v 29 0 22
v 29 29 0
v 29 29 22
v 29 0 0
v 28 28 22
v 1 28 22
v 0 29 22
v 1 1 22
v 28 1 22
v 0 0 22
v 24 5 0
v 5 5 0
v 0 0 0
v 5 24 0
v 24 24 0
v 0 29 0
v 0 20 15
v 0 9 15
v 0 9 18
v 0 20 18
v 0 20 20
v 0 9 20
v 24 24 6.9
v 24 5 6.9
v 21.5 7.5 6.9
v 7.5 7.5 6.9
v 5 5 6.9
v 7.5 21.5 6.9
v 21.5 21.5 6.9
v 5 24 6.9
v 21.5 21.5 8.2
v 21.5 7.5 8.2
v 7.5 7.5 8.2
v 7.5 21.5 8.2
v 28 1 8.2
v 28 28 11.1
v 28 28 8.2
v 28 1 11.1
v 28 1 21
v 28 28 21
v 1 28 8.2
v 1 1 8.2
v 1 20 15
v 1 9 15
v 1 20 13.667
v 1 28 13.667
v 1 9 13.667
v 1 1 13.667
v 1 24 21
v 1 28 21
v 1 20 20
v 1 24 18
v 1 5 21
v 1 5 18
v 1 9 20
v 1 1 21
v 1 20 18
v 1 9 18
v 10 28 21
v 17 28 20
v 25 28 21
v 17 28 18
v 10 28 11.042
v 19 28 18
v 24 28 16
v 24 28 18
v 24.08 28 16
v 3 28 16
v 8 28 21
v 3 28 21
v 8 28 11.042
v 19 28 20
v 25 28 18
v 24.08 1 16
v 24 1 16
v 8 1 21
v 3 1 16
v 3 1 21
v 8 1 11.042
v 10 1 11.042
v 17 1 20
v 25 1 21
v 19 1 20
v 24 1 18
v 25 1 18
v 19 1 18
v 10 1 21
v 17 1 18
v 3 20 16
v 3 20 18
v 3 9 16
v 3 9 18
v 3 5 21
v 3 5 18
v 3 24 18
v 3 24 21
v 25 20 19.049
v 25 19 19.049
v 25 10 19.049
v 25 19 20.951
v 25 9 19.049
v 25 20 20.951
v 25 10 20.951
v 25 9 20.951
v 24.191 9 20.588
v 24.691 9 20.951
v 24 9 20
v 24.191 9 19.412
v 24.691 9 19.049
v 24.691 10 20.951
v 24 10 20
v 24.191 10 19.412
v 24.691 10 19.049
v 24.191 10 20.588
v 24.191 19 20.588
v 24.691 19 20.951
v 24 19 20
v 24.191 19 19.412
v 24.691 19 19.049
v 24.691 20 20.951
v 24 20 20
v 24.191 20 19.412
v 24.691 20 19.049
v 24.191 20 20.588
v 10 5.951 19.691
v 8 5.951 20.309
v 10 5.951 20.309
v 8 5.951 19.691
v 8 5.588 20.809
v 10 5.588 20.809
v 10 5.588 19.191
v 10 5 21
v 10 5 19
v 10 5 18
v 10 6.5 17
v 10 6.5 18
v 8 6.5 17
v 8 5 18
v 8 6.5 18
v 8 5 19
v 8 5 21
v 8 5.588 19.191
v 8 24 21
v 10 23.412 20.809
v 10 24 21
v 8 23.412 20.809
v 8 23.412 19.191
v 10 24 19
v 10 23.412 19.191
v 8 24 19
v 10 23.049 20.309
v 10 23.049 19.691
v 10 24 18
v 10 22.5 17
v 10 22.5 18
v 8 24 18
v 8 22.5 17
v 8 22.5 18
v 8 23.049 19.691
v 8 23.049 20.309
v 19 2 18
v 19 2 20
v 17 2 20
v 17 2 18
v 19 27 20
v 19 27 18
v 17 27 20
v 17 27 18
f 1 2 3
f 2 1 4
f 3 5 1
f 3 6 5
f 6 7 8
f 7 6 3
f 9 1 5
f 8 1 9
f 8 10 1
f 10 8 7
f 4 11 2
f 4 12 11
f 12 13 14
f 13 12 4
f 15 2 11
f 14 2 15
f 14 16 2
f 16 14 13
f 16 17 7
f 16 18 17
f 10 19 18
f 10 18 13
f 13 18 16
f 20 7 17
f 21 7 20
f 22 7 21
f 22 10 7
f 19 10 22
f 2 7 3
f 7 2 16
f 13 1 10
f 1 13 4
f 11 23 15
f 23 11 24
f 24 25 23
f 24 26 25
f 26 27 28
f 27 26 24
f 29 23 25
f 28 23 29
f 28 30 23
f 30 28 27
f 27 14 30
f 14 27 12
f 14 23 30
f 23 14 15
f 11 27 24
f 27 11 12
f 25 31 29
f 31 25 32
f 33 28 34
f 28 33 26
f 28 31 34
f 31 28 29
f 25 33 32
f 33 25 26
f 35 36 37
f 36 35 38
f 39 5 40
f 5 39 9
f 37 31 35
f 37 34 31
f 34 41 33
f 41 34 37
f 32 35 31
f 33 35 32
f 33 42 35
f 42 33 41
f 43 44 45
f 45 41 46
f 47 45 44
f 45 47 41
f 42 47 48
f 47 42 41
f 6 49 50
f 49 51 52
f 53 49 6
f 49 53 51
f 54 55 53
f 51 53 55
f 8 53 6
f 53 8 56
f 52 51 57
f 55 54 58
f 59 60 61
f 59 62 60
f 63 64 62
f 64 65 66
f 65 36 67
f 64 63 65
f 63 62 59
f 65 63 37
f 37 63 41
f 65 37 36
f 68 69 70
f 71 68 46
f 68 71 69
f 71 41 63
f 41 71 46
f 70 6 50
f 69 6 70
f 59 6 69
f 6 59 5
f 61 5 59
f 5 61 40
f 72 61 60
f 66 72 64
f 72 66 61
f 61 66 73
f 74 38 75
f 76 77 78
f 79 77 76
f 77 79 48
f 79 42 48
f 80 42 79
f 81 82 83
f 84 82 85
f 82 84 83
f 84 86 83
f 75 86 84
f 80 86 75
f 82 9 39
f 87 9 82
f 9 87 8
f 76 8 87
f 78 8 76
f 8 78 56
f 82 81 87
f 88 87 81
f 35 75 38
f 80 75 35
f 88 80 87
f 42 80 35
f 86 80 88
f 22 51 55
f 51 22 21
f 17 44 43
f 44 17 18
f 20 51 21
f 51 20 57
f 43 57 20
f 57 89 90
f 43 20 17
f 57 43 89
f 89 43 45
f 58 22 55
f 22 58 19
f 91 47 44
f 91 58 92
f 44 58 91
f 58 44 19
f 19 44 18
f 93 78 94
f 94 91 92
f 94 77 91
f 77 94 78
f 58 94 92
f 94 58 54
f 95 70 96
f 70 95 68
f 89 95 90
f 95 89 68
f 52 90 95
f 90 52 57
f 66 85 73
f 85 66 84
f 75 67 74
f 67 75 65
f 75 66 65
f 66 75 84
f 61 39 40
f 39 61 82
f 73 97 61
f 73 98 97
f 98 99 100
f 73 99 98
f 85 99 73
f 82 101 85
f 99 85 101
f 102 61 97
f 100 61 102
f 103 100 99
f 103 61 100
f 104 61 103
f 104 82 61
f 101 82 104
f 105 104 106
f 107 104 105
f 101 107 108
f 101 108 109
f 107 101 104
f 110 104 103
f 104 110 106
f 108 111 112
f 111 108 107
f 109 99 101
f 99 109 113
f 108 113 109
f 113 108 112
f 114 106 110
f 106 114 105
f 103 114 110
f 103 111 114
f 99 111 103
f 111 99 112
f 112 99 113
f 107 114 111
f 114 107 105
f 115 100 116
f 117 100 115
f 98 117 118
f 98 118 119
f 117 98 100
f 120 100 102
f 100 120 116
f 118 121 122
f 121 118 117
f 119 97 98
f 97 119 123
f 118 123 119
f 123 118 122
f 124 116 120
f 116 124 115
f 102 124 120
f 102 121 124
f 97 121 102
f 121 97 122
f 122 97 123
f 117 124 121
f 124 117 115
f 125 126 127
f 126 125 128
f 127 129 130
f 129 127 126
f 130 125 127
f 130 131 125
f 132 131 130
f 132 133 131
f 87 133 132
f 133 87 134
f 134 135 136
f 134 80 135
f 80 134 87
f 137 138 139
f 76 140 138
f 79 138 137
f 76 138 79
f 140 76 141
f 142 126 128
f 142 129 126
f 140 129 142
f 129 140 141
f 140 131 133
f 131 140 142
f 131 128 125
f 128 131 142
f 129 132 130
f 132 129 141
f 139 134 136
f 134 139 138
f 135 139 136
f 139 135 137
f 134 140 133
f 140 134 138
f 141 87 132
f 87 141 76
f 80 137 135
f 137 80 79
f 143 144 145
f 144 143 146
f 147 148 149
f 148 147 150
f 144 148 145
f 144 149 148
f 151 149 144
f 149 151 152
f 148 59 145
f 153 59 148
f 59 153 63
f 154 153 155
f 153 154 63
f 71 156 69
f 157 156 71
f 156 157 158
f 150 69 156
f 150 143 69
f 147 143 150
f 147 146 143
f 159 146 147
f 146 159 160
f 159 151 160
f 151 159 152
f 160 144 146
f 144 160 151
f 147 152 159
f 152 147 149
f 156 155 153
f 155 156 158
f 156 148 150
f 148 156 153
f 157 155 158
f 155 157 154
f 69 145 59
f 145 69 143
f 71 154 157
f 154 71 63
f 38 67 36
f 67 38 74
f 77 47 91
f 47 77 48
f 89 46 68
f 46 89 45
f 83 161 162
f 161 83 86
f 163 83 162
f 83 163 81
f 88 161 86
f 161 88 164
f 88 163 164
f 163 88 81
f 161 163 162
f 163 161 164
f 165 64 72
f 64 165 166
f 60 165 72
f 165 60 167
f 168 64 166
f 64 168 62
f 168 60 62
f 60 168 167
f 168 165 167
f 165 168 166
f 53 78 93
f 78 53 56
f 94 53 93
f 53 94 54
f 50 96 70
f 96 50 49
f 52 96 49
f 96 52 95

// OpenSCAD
// A simple enclosure for the Waveshare rp2040-zero board and a single MX compatible keyswitch
// 2023 davidm@davidmonro.net

module prism(l, w, h){
    polyhedron(
        points=[[0,0,0], [l,0,0], [l,w,0], [0,w,0], [0,w,h], [l,w,h]],
        faces=[[0,1,2,3],[5,4,3,2],[0,4,5,1],[0,3,4],[5,2,1]]
    );
}

translate([0,0,0]) {
    difference() {
        union() {
            cube([29,29,22]);
            
        }
        translate([5,5,-0.1]) cube([19,19,7]);
        translate([7.5,7.5,0]) cube([14,14,9]);
        translate([1,1,8.2]) cube([27,27,17]);
        translate([-0.1,9,15]) cube([20,11,5]); // USB
    }
    translate([0,0,16]) cube([3,9,2]);
    translate([0,20,16]) cube([3,9,2]);
    translate([24,0,16]) cube([5,29,2]);
    translate([25,0,16]) cube([4,29,5]);
    translate([25,10,20]) rotate([90,0,0]) cylinder(r=1, $fn=10);
    translate([25,20,20]) rotate([90,0,0]) cylinder(r=1, $fn=10);
    
    translate([8,5,20]) rotate([0,90,0]) cylinder(r=1, h=2, $fn=10);
    translate([8,5,17]) cube([2,1.5,1]);
    translate([8,0,16]) cube([2,5,5]);
    translate([8,6.5,17]) rotate([180,0,0]) color("blue") prism(l=2,w=6,h=6.5);
    
    translate([8,24,20]) rotate([0,90,0]) cylinder(r=1, h=2, $fn=10);
    translate([8,22.5,17]) cube([2,1.5,1]);
    translate([8,24,16]) cube([2,5,5]);
    translate([10,22.5,17]) rotate([180,0,180]) color("blue") prism(l=2,w=6,h=6.5);
    
    
    translate([24,0,16.1]) rotate([180,0,90]) color("orange") prism(l=29,w=4,h=5);
    
    
    
    translate([3,9,16]) rotate([180,0,-90]) prism(l=9,w=3,h=3.5);
    translate([3,29,16]) rotate([180,0,-90]) prism(l=9,w=3,h=3.5);
    
    translate([17,0,18]) color("purple") cube ([2,2,2]);
    translate([17,27,18]) color("purple") cube ([2,2,2]);
    translate([0,1,18]) cube([3,4,3]);
    translate([0,24,18]) cube([3,4,3]);
    
    //translate([1,5.5,18]) color("red") cube([24,18,1]);
}
